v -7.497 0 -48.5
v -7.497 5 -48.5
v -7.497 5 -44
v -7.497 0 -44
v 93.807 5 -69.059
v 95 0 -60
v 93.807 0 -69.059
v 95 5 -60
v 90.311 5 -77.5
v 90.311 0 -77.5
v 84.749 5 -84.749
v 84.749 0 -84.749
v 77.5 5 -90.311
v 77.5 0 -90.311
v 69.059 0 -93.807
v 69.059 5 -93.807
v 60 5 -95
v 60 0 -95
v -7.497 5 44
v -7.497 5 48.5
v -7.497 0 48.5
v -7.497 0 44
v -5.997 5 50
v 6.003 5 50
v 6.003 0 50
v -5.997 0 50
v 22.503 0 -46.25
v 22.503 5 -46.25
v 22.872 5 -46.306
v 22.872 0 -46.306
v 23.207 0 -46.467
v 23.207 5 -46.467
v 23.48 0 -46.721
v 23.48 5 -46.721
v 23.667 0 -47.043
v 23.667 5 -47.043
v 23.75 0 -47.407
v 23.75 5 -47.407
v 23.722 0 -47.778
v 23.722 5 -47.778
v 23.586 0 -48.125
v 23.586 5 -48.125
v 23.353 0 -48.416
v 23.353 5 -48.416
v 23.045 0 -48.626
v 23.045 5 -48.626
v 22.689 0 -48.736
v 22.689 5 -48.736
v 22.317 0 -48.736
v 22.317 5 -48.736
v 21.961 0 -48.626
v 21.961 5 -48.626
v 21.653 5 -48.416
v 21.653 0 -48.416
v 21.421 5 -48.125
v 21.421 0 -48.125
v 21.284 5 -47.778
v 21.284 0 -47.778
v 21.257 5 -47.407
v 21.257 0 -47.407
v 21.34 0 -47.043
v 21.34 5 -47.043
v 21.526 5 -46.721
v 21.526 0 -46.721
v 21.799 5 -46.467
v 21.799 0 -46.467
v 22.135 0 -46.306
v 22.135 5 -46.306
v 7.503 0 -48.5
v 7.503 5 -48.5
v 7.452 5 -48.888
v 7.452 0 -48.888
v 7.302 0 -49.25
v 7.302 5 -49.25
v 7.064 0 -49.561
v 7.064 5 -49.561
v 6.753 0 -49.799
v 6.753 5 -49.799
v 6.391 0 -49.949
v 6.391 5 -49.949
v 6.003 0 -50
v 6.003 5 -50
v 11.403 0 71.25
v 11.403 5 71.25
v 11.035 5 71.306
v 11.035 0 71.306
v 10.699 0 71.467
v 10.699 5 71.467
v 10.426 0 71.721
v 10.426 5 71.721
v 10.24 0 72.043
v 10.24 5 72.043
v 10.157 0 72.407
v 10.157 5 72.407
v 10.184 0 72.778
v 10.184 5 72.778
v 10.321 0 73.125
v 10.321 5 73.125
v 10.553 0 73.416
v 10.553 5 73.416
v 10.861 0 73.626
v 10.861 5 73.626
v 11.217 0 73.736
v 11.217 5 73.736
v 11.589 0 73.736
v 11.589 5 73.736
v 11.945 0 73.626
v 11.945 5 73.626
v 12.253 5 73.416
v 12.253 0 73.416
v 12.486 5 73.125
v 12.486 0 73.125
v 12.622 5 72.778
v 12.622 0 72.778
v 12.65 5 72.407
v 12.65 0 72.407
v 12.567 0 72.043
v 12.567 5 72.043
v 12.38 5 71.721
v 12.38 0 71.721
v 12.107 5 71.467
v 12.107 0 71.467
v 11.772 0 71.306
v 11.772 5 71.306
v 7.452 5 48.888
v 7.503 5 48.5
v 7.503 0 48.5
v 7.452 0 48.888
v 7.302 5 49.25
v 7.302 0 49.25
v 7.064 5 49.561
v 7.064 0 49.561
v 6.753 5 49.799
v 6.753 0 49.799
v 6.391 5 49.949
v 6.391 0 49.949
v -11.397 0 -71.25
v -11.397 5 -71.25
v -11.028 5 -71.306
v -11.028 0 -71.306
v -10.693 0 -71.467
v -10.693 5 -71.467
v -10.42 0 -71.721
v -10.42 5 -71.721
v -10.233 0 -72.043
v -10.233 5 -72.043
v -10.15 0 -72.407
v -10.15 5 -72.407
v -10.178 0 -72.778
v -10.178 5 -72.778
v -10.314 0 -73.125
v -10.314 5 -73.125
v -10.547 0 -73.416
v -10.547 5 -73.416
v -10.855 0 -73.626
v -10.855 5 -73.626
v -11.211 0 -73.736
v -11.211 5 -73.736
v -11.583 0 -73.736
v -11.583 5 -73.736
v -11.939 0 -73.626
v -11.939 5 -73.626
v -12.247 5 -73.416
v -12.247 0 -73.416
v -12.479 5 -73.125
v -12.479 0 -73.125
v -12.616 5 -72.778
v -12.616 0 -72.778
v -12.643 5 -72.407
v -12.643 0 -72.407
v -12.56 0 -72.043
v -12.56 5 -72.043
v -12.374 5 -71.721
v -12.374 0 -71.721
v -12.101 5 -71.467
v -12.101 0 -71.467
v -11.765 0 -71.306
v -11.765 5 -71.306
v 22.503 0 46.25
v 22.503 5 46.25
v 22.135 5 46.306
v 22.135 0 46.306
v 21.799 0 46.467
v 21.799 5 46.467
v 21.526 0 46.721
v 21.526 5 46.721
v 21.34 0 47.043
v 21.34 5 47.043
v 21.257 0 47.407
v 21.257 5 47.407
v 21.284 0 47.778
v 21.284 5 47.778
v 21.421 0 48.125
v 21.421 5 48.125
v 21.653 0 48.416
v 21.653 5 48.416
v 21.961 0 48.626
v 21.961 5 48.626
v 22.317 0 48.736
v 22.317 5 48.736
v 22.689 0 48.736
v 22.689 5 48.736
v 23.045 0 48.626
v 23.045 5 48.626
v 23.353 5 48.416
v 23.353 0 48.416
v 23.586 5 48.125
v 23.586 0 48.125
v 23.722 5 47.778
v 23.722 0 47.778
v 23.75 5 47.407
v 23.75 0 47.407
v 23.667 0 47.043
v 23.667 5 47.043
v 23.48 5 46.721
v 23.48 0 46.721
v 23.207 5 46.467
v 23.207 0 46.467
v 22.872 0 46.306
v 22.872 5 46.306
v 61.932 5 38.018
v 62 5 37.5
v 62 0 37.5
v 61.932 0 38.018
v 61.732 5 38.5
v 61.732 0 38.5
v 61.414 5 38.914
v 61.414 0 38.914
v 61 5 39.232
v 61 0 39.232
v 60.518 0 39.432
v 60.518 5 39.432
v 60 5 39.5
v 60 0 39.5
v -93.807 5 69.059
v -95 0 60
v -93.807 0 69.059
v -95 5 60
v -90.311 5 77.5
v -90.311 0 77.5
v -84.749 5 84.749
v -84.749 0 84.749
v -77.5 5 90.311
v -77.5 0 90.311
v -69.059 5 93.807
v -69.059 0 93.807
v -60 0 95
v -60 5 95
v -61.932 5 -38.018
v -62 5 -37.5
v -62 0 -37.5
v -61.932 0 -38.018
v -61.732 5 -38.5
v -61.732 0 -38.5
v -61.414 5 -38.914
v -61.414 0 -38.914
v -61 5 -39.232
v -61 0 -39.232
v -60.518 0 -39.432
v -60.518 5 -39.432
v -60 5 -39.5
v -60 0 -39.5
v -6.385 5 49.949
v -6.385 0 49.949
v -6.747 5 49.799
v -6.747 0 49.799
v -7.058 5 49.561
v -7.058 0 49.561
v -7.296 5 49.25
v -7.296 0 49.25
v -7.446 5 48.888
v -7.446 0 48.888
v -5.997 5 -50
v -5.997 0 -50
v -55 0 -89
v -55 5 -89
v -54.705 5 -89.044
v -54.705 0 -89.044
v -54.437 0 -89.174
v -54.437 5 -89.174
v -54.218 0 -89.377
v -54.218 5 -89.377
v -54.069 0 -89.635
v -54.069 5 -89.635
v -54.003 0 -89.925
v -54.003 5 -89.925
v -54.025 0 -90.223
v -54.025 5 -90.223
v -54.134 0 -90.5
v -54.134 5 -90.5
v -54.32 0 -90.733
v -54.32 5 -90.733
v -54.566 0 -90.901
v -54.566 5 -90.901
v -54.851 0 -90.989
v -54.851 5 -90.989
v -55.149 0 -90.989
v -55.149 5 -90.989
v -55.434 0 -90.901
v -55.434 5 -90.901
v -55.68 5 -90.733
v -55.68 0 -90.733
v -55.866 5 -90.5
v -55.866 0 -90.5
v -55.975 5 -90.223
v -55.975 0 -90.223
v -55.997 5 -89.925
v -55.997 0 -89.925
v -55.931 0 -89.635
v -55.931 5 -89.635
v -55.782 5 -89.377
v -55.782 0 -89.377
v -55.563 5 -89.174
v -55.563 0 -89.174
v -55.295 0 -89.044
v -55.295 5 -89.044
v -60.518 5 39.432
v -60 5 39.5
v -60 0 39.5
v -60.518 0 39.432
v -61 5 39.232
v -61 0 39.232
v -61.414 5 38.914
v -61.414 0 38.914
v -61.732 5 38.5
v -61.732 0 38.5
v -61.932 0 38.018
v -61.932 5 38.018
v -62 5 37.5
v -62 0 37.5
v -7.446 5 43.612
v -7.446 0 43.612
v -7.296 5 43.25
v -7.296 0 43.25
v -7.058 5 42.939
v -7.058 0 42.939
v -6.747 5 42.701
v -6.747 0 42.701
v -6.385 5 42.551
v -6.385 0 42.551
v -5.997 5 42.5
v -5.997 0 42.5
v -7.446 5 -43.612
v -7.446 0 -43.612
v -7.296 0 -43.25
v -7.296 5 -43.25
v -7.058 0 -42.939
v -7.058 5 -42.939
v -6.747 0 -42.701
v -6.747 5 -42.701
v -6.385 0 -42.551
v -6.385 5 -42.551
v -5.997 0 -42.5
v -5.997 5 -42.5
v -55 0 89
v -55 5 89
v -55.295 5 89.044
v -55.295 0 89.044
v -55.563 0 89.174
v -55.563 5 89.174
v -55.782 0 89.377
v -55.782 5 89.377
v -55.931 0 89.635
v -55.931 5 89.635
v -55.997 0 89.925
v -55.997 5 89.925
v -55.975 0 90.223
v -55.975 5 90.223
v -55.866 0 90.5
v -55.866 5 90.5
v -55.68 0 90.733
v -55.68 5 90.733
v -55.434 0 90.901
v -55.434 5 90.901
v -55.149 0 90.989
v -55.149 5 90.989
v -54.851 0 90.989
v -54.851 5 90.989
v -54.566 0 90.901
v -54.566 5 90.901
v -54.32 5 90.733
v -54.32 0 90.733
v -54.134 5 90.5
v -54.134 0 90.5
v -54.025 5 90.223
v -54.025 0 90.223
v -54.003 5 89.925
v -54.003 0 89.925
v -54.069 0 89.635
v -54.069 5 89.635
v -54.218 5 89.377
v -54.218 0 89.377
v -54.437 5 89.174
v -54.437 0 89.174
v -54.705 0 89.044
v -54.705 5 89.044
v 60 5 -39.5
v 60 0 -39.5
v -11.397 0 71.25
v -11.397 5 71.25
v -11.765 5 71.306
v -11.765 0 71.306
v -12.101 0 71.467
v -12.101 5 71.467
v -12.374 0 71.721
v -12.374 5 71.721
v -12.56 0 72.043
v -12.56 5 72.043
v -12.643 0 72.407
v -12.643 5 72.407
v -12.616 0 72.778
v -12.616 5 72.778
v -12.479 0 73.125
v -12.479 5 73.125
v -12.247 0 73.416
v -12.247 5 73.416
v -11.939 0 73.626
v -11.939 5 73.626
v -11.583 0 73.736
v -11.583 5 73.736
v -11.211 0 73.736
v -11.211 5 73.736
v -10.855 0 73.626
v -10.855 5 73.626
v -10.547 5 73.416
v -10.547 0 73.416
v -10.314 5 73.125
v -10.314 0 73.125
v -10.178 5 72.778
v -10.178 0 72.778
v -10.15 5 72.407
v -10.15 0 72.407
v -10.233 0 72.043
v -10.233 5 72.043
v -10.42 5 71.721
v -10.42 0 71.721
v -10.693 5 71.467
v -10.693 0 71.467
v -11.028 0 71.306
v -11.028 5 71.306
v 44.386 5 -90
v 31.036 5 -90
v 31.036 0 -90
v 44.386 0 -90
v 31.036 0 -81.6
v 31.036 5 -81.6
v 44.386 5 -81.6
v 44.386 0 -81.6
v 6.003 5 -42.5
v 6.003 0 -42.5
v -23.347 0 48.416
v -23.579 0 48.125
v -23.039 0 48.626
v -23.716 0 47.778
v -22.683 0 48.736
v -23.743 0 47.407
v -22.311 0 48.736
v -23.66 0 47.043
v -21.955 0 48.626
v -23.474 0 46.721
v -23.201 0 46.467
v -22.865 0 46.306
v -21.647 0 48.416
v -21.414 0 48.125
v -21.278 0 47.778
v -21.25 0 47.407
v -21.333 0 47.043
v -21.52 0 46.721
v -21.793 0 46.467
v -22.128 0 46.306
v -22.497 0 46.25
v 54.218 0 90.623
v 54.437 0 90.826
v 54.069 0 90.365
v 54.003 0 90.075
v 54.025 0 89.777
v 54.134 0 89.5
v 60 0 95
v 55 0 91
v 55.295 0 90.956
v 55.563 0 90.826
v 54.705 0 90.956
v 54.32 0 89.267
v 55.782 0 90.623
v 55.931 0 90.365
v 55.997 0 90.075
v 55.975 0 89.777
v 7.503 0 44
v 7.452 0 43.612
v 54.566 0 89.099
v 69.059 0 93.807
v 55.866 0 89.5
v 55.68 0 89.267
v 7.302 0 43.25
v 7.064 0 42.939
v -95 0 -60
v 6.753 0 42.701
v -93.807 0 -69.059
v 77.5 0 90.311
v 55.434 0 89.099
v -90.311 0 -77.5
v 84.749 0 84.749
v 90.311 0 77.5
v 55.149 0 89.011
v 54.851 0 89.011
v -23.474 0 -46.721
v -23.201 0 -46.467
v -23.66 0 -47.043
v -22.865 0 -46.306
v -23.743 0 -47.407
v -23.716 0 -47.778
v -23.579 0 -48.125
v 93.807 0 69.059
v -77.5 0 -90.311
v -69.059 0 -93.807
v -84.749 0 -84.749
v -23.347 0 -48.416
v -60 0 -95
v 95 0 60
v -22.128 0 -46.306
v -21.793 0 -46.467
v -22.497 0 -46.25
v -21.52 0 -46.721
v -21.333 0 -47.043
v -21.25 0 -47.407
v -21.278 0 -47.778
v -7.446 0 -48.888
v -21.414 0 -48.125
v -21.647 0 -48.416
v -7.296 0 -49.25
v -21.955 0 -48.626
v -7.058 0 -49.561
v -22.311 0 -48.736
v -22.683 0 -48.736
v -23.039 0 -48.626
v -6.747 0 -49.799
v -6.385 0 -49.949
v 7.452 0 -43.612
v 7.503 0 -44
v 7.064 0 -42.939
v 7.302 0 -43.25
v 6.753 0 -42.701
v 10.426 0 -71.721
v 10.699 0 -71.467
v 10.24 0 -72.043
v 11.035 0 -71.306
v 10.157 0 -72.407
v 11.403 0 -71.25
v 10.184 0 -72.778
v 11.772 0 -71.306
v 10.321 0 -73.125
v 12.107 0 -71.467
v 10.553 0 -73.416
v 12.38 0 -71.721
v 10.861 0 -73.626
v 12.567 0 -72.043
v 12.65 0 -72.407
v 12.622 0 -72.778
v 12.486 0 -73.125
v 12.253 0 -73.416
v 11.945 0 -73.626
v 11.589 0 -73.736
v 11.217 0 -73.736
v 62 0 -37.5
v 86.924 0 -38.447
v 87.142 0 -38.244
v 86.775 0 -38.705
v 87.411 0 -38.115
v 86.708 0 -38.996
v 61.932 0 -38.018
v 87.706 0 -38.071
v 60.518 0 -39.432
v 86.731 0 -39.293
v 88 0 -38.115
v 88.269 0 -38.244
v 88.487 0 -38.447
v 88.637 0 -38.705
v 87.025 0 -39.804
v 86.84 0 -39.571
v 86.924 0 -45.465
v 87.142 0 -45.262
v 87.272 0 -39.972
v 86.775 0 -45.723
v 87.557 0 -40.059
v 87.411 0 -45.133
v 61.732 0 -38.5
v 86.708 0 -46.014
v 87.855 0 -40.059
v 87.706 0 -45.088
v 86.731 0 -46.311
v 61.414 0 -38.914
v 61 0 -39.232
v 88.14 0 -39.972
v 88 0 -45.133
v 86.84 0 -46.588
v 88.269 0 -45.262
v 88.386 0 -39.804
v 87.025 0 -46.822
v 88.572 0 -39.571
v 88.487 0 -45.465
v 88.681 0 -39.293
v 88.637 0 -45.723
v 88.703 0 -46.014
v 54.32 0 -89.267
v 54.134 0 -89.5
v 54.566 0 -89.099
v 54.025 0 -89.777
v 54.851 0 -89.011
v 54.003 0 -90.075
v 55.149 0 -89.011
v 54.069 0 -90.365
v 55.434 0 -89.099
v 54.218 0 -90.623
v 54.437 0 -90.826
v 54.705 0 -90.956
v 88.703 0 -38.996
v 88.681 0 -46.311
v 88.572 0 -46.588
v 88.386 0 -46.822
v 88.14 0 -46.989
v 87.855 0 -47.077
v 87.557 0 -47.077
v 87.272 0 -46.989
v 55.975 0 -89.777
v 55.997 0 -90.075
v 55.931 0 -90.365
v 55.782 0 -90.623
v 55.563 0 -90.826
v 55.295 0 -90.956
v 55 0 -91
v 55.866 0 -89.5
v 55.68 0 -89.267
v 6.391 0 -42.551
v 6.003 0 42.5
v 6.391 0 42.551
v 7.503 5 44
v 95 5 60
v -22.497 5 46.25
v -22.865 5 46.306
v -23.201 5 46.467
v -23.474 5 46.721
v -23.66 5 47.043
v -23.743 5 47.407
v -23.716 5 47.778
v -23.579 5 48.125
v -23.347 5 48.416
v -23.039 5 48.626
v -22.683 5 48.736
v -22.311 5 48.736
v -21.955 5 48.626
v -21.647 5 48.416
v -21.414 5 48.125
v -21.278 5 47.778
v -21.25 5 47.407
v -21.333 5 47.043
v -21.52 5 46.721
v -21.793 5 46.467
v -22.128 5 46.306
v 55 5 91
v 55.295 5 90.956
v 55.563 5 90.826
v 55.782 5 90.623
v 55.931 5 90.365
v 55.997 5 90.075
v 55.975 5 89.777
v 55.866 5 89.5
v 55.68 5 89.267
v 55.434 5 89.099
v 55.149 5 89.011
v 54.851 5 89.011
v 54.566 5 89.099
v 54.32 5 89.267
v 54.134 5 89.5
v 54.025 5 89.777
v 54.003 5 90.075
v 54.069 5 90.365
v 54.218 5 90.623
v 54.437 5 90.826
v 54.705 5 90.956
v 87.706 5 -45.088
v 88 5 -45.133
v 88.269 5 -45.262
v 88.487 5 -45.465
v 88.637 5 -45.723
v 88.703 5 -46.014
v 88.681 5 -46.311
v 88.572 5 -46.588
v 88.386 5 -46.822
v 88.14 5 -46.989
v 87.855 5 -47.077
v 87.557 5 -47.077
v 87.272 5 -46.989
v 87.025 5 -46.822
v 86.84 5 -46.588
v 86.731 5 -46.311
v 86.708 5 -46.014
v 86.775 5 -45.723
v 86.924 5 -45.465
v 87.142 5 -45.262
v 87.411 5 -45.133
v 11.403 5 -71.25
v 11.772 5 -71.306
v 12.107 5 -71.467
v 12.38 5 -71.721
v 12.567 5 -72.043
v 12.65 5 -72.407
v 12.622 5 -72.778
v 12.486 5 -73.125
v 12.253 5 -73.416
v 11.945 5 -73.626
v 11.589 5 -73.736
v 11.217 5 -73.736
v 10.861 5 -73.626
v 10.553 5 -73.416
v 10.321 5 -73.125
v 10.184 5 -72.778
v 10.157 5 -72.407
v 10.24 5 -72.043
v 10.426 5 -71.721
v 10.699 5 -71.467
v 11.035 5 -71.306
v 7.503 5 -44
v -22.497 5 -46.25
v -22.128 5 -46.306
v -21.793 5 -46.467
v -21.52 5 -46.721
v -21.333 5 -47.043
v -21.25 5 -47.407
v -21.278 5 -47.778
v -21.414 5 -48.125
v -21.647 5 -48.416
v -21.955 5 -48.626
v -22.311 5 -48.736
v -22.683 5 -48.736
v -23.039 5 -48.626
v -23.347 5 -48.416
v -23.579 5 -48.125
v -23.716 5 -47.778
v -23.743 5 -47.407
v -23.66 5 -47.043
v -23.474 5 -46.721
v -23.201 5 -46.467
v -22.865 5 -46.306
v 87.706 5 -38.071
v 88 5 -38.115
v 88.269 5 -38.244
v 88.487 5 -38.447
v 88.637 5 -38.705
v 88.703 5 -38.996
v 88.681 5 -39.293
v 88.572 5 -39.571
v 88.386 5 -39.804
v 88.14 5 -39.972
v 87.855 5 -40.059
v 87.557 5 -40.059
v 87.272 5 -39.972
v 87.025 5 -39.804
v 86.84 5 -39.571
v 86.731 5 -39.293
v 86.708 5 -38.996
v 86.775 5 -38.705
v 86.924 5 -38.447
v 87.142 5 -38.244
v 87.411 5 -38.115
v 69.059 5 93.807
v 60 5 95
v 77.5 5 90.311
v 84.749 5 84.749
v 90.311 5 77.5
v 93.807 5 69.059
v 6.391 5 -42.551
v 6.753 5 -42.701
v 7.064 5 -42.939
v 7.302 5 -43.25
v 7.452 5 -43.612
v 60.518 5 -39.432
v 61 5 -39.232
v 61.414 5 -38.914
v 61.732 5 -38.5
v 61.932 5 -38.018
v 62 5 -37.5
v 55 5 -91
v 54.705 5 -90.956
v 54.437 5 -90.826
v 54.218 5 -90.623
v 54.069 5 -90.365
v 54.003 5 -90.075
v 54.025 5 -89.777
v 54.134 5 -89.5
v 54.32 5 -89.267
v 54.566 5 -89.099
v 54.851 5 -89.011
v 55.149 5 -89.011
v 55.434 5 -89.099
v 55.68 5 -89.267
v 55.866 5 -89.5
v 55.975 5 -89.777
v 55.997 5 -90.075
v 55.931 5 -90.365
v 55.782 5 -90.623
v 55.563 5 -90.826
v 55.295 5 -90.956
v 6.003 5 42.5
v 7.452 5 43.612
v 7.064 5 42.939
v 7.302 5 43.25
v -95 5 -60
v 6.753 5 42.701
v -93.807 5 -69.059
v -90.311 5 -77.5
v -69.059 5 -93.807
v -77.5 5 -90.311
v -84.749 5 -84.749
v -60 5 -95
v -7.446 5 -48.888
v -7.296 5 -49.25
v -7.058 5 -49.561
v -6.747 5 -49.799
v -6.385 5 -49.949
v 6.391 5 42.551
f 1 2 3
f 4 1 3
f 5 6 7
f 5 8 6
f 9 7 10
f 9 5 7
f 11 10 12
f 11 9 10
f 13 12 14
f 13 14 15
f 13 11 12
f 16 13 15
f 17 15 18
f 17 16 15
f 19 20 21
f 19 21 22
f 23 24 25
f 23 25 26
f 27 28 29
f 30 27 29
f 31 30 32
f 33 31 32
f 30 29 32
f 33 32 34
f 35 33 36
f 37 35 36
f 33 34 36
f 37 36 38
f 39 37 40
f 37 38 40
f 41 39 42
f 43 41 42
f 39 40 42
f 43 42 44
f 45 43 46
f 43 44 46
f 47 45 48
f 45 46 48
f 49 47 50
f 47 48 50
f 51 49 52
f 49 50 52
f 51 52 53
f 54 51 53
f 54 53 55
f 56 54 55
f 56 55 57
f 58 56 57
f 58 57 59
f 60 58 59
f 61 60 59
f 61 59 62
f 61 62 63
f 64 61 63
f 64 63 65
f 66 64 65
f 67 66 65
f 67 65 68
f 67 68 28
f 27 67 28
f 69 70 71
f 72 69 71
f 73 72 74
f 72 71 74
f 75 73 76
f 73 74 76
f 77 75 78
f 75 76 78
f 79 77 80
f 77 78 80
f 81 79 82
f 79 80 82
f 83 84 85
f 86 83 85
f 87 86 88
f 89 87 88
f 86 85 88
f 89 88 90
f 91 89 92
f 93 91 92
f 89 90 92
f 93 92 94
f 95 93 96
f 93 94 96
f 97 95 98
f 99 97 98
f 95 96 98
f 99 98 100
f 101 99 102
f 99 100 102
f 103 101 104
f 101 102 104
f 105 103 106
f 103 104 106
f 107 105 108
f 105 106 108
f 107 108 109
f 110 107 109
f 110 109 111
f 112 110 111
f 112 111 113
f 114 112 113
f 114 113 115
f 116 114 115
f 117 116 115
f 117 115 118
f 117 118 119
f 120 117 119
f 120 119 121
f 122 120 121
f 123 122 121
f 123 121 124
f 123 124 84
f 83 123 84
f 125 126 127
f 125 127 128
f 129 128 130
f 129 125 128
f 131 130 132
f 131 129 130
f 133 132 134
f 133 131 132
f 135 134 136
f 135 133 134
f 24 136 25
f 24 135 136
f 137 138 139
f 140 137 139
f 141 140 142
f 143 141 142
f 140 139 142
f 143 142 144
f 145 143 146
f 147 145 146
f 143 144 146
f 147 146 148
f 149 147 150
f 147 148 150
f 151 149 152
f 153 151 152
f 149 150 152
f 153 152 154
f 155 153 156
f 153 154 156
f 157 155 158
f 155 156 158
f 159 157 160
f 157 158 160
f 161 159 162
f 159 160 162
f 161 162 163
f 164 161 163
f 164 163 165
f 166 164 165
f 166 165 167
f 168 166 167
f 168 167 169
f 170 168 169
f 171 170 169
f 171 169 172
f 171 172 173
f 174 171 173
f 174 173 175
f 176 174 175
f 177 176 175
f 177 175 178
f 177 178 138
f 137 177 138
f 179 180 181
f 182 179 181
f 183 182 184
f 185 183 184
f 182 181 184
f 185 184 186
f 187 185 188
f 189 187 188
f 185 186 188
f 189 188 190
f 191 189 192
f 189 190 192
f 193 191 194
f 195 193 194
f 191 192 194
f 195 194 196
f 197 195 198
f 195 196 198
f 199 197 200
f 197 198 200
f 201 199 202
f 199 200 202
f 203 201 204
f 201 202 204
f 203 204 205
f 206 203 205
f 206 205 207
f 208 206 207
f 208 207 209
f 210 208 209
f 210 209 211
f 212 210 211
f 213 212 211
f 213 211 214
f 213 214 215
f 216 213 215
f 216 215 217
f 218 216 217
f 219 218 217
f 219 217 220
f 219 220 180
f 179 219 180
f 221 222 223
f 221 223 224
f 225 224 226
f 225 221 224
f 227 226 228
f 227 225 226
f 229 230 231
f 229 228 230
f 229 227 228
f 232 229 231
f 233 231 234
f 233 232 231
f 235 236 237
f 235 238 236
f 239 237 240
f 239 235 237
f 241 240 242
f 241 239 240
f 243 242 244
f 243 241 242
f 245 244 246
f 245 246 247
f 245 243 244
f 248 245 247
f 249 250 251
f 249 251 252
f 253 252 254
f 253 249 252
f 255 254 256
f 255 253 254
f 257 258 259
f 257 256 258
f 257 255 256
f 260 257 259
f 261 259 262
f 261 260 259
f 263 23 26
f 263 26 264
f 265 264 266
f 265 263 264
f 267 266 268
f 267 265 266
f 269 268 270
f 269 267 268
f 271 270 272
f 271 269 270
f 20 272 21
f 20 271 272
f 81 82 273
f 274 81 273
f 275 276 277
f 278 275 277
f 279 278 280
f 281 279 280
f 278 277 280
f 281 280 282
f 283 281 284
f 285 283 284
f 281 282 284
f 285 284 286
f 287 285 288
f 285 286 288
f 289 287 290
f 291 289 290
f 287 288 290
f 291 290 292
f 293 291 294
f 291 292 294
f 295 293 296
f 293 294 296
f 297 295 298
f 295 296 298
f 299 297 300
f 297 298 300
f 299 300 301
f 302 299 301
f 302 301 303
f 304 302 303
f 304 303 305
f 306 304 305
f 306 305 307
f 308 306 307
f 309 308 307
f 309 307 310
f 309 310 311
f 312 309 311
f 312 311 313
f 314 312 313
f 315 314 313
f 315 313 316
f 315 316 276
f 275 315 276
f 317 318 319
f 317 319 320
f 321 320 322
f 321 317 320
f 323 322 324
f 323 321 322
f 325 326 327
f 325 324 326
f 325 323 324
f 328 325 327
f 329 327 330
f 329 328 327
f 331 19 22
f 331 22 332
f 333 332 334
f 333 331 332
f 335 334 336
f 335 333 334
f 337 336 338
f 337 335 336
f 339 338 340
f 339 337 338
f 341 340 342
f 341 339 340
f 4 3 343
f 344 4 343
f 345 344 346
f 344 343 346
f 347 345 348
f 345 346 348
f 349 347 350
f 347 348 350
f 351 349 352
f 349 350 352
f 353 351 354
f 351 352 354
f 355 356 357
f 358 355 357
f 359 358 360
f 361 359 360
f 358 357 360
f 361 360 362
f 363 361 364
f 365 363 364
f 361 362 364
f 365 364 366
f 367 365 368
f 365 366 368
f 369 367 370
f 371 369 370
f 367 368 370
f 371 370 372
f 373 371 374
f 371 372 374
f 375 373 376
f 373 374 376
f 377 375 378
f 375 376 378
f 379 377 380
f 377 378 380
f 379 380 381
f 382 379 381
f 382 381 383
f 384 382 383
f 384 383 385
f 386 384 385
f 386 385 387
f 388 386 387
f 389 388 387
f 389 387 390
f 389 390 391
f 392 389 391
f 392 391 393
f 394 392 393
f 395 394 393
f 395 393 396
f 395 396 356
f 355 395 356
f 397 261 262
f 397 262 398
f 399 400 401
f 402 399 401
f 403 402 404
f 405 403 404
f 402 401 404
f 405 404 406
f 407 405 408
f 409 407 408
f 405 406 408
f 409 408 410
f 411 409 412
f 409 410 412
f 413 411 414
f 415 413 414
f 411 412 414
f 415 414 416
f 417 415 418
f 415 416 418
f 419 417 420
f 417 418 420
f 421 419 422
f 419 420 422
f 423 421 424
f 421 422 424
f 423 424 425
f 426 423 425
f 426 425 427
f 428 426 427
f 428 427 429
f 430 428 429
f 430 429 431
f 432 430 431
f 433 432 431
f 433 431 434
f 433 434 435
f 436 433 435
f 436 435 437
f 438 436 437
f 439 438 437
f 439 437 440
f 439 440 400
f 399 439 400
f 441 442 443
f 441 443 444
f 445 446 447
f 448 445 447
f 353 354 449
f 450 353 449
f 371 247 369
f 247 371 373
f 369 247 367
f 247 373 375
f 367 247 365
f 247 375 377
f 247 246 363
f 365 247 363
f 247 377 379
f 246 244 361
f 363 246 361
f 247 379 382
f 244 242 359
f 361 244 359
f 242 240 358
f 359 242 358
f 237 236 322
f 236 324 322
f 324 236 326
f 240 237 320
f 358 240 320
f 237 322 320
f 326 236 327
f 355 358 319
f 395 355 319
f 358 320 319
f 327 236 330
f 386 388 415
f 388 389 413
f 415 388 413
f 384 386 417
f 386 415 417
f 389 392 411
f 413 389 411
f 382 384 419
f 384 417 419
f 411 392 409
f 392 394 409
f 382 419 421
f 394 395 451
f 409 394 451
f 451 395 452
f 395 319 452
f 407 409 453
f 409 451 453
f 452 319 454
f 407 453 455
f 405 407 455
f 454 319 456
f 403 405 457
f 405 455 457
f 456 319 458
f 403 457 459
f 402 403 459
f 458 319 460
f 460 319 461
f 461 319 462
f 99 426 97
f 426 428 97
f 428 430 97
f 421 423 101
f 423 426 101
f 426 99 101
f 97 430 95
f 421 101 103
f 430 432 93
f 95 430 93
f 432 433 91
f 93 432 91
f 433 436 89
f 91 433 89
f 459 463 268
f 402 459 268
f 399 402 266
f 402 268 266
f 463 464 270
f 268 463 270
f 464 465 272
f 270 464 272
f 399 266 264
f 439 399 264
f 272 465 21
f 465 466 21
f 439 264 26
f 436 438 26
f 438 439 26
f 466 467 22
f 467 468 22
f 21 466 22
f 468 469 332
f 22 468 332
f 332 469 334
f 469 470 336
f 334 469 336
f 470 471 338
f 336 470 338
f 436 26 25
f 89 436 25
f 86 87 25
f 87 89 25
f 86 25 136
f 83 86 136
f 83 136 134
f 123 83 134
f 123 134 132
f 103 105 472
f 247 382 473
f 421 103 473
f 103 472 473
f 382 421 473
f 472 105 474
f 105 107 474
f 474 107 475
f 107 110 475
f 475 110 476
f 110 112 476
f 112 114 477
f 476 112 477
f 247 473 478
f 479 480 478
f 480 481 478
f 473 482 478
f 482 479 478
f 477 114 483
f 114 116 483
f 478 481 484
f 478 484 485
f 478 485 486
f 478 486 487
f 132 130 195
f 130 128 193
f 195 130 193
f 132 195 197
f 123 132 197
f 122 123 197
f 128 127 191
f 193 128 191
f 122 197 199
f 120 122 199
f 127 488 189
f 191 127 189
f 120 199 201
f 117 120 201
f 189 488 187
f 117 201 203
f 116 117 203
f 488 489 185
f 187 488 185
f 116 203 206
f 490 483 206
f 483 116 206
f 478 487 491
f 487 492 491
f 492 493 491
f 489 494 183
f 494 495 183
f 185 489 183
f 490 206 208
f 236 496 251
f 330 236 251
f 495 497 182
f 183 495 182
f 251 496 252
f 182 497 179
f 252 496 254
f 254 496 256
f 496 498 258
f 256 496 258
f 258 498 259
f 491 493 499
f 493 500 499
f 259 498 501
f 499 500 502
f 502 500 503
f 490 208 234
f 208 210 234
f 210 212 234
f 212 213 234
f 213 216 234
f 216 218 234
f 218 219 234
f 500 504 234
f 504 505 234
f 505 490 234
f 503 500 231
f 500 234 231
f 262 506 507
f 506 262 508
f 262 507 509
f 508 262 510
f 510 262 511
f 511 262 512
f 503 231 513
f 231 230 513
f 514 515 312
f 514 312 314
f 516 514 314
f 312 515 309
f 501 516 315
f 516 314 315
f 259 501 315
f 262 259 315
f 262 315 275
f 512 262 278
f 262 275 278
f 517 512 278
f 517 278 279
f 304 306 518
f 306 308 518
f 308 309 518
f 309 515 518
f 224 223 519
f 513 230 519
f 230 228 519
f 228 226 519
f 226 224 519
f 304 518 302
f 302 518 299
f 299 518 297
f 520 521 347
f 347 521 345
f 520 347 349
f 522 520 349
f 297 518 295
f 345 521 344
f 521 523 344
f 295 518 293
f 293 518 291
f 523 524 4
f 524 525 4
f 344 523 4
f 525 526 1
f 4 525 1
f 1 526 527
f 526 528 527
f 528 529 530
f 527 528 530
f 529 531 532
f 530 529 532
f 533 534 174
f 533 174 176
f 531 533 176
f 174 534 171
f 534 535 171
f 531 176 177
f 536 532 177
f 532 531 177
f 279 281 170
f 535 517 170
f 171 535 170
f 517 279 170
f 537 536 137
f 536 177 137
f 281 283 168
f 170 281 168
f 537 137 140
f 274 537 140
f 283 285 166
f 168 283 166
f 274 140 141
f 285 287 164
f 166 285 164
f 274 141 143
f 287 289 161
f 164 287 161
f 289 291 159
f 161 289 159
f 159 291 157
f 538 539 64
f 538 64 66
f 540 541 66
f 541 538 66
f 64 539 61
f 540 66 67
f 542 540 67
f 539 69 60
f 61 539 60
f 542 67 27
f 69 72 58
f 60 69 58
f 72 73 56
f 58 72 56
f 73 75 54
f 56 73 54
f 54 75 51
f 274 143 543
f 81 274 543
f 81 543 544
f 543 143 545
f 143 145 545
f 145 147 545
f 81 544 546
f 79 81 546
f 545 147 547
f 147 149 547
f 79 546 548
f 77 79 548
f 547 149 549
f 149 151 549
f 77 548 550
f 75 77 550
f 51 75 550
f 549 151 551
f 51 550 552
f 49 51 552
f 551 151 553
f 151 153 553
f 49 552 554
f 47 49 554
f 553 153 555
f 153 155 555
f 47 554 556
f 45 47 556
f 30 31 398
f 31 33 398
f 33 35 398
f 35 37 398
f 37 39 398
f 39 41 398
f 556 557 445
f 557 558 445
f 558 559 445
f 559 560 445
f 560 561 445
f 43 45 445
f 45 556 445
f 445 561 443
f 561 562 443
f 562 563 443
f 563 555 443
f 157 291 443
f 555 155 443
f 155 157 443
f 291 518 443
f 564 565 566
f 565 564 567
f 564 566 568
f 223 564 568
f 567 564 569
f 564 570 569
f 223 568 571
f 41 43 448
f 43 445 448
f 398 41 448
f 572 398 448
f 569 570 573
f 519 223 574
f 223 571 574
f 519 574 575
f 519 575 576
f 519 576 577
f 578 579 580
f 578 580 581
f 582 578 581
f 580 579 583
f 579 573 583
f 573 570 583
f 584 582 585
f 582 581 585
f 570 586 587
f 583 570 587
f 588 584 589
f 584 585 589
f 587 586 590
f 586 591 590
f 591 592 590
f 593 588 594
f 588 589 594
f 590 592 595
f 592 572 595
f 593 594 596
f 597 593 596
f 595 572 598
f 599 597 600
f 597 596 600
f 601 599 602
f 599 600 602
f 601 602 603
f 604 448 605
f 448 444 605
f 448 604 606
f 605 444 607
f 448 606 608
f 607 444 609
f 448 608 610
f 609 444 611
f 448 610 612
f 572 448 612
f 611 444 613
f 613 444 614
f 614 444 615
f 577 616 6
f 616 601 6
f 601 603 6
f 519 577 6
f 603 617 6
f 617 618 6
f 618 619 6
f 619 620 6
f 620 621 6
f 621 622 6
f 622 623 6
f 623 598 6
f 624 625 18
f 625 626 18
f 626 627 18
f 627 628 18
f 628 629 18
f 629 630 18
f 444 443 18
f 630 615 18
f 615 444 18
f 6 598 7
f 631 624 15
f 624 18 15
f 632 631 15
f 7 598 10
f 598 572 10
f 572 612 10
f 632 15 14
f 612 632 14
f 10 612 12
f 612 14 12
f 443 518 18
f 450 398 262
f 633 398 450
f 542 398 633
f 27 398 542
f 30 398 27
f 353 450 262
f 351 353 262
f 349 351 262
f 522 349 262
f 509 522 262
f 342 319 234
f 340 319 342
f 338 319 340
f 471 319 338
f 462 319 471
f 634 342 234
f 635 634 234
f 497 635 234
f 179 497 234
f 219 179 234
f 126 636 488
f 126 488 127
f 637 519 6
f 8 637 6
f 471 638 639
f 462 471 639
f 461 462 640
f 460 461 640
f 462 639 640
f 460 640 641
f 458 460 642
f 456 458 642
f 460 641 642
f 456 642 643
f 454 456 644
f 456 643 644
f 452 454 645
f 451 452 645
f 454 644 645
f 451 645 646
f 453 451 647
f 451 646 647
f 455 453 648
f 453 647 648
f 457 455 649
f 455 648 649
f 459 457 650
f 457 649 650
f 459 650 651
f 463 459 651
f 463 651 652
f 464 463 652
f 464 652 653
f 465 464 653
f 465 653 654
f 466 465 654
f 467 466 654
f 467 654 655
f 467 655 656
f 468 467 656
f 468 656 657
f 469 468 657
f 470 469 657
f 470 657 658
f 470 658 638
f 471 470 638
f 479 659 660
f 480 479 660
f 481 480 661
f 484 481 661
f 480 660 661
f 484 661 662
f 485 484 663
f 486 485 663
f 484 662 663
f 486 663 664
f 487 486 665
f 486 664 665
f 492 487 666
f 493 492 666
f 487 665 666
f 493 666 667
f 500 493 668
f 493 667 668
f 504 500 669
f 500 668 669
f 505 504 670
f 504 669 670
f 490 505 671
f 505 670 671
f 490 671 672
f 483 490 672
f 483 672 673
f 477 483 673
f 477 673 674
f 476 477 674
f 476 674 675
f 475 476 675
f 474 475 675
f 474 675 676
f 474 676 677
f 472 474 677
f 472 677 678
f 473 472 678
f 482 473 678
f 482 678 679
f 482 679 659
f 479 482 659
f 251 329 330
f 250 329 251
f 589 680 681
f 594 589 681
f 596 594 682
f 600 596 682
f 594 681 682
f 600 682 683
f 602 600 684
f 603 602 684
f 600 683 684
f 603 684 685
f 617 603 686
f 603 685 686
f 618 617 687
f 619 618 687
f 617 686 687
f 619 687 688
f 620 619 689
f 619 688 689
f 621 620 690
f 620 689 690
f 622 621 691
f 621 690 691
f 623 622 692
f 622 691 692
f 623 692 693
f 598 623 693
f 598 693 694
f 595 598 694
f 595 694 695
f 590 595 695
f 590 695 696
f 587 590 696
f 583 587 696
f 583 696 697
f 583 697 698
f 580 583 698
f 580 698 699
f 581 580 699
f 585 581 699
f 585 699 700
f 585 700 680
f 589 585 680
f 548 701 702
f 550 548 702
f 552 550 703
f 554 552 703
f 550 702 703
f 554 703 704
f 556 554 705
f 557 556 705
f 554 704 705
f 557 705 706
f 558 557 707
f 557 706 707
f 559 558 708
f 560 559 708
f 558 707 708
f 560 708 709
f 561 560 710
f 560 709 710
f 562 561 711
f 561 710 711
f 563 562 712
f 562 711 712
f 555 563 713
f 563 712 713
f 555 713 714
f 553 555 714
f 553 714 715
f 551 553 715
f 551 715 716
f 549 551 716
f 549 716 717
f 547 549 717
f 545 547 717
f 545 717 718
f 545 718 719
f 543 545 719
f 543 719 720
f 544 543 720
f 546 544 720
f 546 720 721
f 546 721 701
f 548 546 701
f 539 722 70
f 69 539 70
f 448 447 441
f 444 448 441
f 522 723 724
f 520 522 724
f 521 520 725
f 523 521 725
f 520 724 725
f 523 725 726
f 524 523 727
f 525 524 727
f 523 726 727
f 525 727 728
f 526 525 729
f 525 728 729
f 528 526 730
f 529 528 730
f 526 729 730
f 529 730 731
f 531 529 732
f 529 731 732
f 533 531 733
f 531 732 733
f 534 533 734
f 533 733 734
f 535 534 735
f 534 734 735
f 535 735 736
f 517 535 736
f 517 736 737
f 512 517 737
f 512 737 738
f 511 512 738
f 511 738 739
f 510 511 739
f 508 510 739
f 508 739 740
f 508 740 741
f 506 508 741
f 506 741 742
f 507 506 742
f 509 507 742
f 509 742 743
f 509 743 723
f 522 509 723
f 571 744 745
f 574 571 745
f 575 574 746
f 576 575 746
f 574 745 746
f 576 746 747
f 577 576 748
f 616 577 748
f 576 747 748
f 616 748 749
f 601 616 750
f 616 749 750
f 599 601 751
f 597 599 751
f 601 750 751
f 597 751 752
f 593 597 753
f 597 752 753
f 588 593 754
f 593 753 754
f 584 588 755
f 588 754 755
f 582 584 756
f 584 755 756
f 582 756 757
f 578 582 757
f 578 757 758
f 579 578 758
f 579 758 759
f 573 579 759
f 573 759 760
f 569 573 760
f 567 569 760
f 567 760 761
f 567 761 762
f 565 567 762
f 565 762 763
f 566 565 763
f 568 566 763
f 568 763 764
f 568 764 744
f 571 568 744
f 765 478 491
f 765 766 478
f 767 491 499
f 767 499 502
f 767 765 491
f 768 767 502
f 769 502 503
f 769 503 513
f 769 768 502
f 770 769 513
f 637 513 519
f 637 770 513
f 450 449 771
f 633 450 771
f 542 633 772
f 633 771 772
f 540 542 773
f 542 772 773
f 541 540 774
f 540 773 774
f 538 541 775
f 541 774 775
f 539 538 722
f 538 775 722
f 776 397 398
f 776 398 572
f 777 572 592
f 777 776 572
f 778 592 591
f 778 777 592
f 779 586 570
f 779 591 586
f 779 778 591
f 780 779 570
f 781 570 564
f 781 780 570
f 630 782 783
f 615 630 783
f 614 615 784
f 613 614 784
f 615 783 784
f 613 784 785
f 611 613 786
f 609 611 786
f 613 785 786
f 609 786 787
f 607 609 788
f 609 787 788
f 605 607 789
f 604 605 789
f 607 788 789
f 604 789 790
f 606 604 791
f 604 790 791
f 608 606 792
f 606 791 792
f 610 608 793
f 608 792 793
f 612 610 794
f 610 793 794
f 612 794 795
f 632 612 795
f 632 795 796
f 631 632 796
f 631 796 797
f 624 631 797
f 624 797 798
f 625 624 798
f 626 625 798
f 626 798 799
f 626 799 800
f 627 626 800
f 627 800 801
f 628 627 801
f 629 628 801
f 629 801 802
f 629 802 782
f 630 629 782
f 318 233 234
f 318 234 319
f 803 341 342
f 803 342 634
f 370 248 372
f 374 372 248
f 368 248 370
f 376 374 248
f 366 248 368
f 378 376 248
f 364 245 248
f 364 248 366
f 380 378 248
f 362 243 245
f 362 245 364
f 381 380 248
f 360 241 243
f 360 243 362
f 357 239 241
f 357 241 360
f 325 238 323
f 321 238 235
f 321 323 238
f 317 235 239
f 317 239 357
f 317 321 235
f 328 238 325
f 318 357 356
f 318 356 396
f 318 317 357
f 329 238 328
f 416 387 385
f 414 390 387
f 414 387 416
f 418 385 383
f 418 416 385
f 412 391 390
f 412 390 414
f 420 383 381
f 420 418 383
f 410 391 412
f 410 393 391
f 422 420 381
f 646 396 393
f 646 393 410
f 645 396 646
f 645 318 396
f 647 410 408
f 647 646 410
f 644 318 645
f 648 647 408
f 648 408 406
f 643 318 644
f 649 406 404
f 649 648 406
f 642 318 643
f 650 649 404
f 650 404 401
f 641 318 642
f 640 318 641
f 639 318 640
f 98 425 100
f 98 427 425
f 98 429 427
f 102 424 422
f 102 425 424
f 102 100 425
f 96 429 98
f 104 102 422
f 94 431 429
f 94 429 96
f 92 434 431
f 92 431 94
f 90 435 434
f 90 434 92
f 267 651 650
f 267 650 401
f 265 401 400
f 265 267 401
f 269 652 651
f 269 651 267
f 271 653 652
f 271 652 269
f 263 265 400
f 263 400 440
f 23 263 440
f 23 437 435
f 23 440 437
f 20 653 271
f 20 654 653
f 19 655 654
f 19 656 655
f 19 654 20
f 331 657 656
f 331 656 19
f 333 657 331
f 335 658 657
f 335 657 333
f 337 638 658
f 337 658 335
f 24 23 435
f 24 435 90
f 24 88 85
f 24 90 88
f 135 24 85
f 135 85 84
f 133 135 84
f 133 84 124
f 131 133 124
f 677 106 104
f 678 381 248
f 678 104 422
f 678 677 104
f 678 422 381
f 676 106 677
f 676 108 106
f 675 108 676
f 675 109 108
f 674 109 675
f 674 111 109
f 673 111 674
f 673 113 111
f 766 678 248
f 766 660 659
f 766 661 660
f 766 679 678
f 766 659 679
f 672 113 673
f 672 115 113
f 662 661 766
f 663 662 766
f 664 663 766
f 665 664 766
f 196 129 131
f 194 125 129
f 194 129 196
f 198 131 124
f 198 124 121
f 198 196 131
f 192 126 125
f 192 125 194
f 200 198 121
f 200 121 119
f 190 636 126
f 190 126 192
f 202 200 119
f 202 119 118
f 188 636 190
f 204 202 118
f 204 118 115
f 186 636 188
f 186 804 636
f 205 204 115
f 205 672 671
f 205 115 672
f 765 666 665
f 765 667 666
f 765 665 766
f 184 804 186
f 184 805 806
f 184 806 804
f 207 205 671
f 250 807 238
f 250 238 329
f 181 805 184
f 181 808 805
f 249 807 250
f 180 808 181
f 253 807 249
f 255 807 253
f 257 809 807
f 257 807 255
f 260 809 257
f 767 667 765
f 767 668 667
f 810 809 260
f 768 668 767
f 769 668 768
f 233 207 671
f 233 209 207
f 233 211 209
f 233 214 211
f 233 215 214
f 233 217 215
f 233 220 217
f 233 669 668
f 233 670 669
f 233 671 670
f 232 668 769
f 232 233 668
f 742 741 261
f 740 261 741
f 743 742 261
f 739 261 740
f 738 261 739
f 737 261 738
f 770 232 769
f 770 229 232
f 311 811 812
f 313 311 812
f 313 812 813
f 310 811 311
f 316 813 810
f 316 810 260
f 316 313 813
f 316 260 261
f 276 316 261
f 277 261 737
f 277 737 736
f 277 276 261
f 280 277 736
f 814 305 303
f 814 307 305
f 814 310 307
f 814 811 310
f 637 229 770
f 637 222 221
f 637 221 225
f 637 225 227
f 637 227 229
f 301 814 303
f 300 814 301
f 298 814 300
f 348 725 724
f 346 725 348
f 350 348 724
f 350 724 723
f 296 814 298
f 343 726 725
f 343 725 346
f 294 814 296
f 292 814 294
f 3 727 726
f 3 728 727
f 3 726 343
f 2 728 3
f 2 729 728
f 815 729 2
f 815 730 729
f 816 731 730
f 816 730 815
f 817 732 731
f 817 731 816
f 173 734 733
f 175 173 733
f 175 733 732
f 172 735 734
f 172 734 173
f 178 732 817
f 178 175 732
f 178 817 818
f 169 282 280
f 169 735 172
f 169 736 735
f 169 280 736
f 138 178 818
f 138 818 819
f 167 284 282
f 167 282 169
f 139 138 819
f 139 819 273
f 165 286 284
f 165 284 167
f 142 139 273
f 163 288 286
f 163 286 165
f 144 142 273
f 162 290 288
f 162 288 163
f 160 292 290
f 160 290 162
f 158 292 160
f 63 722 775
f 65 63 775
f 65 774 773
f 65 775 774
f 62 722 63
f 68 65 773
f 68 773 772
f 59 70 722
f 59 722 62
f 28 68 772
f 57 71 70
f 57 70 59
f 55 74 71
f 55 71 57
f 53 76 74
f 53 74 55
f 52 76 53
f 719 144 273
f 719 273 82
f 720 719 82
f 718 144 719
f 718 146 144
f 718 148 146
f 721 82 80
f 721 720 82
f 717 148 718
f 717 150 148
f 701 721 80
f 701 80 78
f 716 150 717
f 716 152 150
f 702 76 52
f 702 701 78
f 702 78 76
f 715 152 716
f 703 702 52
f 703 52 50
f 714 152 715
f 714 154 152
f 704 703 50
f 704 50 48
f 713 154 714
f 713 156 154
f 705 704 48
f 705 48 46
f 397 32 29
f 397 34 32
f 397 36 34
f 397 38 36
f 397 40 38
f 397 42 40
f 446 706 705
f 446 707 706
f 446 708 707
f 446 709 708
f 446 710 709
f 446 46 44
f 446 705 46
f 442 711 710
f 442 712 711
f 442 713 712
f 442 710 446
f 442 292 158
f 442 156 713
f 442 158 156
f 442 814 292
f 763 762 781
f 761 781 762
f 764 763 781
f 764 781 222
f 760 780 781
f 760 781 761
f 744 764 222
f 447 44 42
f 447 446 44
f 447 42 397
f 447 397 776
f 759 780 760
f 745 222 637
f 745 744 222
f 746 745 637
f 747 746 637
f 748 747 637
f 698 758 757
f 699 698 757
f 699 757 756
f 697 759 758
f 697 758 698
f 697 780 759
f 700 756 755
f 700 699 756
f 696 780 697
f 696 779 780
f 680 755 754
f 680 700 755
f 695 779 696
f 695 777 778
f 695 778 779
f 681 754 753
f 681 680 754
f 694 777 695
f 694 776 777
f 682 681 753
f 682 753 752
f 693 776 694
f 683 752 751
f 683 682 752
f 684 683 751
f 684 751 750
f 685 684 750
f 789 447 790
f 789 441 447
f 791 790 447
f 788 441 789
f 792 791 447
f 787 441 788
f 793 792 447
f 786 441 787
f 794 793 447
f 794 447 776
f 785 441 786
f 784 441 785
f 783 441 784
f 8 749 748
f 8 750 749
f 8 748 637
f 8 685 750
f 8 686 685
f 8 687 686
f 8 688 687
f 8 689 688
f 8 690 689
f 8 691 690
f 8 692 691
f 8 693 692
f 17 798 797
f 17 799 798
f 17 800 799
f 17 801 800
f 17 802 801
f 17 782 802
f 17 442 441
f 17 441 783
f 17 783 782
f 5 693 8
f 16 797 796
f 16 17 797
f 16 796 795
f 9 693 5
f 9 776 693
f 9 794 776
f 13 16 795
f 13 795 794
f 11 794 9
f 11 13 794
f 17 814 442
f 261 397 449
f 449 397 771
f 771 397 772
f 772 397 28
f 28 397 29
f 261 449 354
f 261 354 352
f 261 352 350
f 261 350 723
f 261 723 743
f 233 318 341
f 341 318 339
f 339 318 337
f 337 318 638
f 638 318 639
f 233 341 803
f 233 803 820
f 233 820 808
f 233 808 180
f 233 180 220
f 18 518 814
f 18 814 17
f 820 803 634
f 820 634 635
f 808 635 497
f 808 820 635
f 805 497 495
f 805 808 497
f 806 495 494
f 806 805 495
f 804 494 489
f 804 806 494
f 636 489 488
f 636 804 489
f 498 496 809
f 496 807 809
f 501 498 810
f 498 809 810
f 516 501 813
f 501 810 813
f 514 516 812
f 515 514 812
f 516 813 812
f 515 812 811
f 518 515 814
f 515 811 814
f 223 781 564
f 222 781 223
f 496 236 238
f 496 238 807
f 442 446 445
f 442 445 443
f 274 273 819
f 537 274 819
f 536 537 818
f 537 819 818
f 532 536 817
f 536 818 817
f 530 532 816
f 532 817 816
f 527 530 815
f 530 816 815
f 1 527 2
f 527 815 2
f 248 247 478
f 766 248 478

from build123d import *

# Parameters (mm, degrees)
ESBO_O1_W                = 190
ESBO_O1_H                = 190
RESSALTO_EXTRUS_O1_DEPTH = 5
FILETE1_R                = 35
ESBO_O2_R                = 1
CORTE_EXTRUS_O1_DEPTH    = 135.443296597
CORTE_EXTRUS_O2_DEPTH    = 10
SKETCH3_R                = 1.25
CUT_EXTRUDE1_DEPTH       = 135.443296597
SKETCH5_R                = 1
CUT_EXTRUDE3_DEPTH       = 135.443296597
SKETCH7_W                = 13.35
SKETCH7_H                = 8.4
CUT_EXTRUDE5_DEPTH       = 135.443296597
CUT_EXTRUDE6_DEPTH       = 135.443296597


with BuildPart() as part:
    # Esboço1 → Ressalto-extrusão1 (new body)
    with BuildSketch(Plane(origin=(0, 0, 0), x_dir=(1, 0, 0), z_dir=(0, 1, 0))):
        Rectangle(ESBO_O1_W, ESBO_O1_H)
    extrude(amount=RESSALTO_EXTRUS_O1_DEPTH)

    # Filete1
    filete1_edges = [part.edges().sort_by_distance(p)[0] for p in [
        (95, 2.5, 95),
        (-95, 2.5, 95),
        (-95, 2.5, -95),
        (95, 2.5, -95),
    ]]
    fillet(filete1_edges, radius=FILETE1_R)

    # Esboço2 → Corte-extrusão1 (cut, through all)
    with BuildSketch(Plane(origin=(0, 5, 0), x_dir=(1, 0, 0), z_dir=(0, 1, 0))):
        with Locations(Location((-55, 90, 0), (0, 0, 270))):
            Circle(ESBO_O2_R)
        with Locations(Location((55, 90, 0), (0, 0, 90))):
            Circle(ESBO_O2_R)
        with Locations(Location((55, -90, 0), (0, 0, 270))):
            Circle(ESBO_O2_R)
        with Locations(Location((-55, -90, 0), (0, 0, 90))):
            Circle(ESBO_O2_R)
    extrude(amount=-CORTE_EXTRUS_O1_DEPTH, mode=Mode.SUBTRACT)

    # Esboço3 → Corte-extrusão2 (cut)
    with BuildSketch(Plane(origin=(0, 5, 0), x_dir=(1, 0, 0), z_dir=(0, 1, 0))):
        with BuildLine():
            Line((-60, 39.5), (60, 39.5))
            ThreePointArc((60, 39.5), (61.414213562, 38.914213562), (62, 37.5))
            Line((62, 37.5), (62, -37.5))
            ThreePointArc((62, -37.5), (61.414213562, -38.914213562), (60, -39.5))
            Line((60, -39.5), (-60, -39.5))
            ThreePointArc((-60, -39.5), (-61.414213562, -38.914213562), (-62, -37.5))
            Line((-62, -37.5), (-62, 37.5))
            ThreePointArc((-62, 37.5), (-61.414213562, 38.914213562), (-60, 39.5))
        make_face()
    extrude(amount=-CORTE_EXTRUS_O2_DEPTH, mode=Mode.SUBTRACT)

    # Sketch3 → Cut-Extrude1 (cut, through all)
    with BuildSketch(Plane(origin=(0, 5, 0), x_dir=(1, 0, 0), z_dir=(0, 1, 0))):
        with Locations(Location((22.50310845, 47.5, 0), (0, 0, 270))):
            Circle(SKETCH3_R)
        with Locations(Location((-22.49689155, 47.5, 0), (0, 0, 270))):
            Circle(SKETCH3_R)
        with Locations(Location((-11.39689155, 72.5, 0), (0, 0, 270))):
            Circle(SKETCH3_R)
        with Locations(Location((11.40310845, 72.5, 0), (0, 0, 270))):
            Circle(SKETCH3_R)
        with Locations(Location((11.40310845, -72.5, 0), (0, 0, 90))):
            Circle(SKETCH3_R)
        with Locations(Location((-11.39689155, -72.5, 0), (0, 0, 90))):
            Circle(SKETCH3_R)
        with Locations(Location((-22.49689155, -47.5, 0), (0, 0, 90))):
            Circle(SKETCH3_R)
        with Locations(Location((22.50310845, -47.5, 0), (0, 0, 90))):
            Circle(SKETCH3_R)
    extrude(amount=-CUT_EXTRUDE1_DEPTH, mode=Mode.SUBTRACT)

    # Sketch5 → Cut-Extrude3 (cut, through all)
    with BuildSketch(Plane(origin=(0, 5, 0), x_dir=(1, 0, 0), z_dir=(0, 1, 0))):
        with Locations(Location((87.705642178, 46.088474581, 0), (0, 0, 270))):
            Circle(SKETCH5_R)
        with Locations(Location((87.705642178, 39.070544877, 0), (0, 0, 270))):
            Circle(SKETCH5_R)
    extrude(amount=-CUT_EXTRUDE3_DEPTH, mode=Mode.SUBTRACT)

    # Sketch7 → Cut-Extrude5 (cut, through all)
    with BuildSketch(Plane(origin=(0, 5, 0), x_dir=(1, 0, 0), z_dir=(0, 1, 0))):
        with Locations((37.711300079, 85.8)):
            Rectangle(SKETCH7_W, SKETCH7_H)
    extrude(amount=-CUT_EXTRUDE5_DEPTH, mode=Mode.SUBTRACT)

    # Sketch8 → Cut-Extrude6 (cut, through all)
    with BuildSketch(Plane(origin=(0, 5, 0), x_dir=(1, 0, 0), z_dir=(0, 1, 0))):
        with BuildLine():
            Line((6.00310845, -50), (-5.99689155, -50))
            ThreePointArc((-5.99689155, -50), (-7.057551722, -49.560660172), (-7.49689155, -48.5))
            Line((-7.49689155, -48.5), (-7.49689155, -44))
            ThreePointArc((-7.49689155, -44), (-7.057551722, -42.939339828), (-5.99689155, -42.5))
            Line((-5.99689155, -42.5), (6.00310845, -42.5))
            ThreePointArc((6.00310845, -42.5), (7.063768622, -42.939339828), (7.50310845, -44))
            Line((7.50310845, -44), (7.50310845, -48.5))
            ThreePointArc((7.50310845, -48.5), (7.063768622, -49.560660172), (6.00310845, -50))
        make_face()
        with BuildLine():
            Line((-7.49689155, 48.5), (-7.49689155, 44))
            ThreePointArc((-7.49689155, 44), (-7.057551722, 42.939339828), (-5.99689155, 42.5))
            Line((-5.99689155, 42.5), (6.00310845, 42.5))
            ThreePointArc((6.00310845, 42.5), (7.063768622, 42.939339828), (7.50310845, 44))
            Line((7.50310845, 44), (7.50310845, 48.5))
            ThreePointArc((7.50310845, 48.5), (7.063768622, 49.560660172), (6.00310845, 50))
            Line((6.00310845, 50), (-5.99689155, 50))
            ThreePointArc((-5.99689155, 50), (-7.057551722, 49.560660172), (-7.49689155, 48.5))
        make_face()
    extrude(amount=-CUT_EXTRUDE6_DEPTH, mode=Mode.SUBTRACT)


solid = part.part
